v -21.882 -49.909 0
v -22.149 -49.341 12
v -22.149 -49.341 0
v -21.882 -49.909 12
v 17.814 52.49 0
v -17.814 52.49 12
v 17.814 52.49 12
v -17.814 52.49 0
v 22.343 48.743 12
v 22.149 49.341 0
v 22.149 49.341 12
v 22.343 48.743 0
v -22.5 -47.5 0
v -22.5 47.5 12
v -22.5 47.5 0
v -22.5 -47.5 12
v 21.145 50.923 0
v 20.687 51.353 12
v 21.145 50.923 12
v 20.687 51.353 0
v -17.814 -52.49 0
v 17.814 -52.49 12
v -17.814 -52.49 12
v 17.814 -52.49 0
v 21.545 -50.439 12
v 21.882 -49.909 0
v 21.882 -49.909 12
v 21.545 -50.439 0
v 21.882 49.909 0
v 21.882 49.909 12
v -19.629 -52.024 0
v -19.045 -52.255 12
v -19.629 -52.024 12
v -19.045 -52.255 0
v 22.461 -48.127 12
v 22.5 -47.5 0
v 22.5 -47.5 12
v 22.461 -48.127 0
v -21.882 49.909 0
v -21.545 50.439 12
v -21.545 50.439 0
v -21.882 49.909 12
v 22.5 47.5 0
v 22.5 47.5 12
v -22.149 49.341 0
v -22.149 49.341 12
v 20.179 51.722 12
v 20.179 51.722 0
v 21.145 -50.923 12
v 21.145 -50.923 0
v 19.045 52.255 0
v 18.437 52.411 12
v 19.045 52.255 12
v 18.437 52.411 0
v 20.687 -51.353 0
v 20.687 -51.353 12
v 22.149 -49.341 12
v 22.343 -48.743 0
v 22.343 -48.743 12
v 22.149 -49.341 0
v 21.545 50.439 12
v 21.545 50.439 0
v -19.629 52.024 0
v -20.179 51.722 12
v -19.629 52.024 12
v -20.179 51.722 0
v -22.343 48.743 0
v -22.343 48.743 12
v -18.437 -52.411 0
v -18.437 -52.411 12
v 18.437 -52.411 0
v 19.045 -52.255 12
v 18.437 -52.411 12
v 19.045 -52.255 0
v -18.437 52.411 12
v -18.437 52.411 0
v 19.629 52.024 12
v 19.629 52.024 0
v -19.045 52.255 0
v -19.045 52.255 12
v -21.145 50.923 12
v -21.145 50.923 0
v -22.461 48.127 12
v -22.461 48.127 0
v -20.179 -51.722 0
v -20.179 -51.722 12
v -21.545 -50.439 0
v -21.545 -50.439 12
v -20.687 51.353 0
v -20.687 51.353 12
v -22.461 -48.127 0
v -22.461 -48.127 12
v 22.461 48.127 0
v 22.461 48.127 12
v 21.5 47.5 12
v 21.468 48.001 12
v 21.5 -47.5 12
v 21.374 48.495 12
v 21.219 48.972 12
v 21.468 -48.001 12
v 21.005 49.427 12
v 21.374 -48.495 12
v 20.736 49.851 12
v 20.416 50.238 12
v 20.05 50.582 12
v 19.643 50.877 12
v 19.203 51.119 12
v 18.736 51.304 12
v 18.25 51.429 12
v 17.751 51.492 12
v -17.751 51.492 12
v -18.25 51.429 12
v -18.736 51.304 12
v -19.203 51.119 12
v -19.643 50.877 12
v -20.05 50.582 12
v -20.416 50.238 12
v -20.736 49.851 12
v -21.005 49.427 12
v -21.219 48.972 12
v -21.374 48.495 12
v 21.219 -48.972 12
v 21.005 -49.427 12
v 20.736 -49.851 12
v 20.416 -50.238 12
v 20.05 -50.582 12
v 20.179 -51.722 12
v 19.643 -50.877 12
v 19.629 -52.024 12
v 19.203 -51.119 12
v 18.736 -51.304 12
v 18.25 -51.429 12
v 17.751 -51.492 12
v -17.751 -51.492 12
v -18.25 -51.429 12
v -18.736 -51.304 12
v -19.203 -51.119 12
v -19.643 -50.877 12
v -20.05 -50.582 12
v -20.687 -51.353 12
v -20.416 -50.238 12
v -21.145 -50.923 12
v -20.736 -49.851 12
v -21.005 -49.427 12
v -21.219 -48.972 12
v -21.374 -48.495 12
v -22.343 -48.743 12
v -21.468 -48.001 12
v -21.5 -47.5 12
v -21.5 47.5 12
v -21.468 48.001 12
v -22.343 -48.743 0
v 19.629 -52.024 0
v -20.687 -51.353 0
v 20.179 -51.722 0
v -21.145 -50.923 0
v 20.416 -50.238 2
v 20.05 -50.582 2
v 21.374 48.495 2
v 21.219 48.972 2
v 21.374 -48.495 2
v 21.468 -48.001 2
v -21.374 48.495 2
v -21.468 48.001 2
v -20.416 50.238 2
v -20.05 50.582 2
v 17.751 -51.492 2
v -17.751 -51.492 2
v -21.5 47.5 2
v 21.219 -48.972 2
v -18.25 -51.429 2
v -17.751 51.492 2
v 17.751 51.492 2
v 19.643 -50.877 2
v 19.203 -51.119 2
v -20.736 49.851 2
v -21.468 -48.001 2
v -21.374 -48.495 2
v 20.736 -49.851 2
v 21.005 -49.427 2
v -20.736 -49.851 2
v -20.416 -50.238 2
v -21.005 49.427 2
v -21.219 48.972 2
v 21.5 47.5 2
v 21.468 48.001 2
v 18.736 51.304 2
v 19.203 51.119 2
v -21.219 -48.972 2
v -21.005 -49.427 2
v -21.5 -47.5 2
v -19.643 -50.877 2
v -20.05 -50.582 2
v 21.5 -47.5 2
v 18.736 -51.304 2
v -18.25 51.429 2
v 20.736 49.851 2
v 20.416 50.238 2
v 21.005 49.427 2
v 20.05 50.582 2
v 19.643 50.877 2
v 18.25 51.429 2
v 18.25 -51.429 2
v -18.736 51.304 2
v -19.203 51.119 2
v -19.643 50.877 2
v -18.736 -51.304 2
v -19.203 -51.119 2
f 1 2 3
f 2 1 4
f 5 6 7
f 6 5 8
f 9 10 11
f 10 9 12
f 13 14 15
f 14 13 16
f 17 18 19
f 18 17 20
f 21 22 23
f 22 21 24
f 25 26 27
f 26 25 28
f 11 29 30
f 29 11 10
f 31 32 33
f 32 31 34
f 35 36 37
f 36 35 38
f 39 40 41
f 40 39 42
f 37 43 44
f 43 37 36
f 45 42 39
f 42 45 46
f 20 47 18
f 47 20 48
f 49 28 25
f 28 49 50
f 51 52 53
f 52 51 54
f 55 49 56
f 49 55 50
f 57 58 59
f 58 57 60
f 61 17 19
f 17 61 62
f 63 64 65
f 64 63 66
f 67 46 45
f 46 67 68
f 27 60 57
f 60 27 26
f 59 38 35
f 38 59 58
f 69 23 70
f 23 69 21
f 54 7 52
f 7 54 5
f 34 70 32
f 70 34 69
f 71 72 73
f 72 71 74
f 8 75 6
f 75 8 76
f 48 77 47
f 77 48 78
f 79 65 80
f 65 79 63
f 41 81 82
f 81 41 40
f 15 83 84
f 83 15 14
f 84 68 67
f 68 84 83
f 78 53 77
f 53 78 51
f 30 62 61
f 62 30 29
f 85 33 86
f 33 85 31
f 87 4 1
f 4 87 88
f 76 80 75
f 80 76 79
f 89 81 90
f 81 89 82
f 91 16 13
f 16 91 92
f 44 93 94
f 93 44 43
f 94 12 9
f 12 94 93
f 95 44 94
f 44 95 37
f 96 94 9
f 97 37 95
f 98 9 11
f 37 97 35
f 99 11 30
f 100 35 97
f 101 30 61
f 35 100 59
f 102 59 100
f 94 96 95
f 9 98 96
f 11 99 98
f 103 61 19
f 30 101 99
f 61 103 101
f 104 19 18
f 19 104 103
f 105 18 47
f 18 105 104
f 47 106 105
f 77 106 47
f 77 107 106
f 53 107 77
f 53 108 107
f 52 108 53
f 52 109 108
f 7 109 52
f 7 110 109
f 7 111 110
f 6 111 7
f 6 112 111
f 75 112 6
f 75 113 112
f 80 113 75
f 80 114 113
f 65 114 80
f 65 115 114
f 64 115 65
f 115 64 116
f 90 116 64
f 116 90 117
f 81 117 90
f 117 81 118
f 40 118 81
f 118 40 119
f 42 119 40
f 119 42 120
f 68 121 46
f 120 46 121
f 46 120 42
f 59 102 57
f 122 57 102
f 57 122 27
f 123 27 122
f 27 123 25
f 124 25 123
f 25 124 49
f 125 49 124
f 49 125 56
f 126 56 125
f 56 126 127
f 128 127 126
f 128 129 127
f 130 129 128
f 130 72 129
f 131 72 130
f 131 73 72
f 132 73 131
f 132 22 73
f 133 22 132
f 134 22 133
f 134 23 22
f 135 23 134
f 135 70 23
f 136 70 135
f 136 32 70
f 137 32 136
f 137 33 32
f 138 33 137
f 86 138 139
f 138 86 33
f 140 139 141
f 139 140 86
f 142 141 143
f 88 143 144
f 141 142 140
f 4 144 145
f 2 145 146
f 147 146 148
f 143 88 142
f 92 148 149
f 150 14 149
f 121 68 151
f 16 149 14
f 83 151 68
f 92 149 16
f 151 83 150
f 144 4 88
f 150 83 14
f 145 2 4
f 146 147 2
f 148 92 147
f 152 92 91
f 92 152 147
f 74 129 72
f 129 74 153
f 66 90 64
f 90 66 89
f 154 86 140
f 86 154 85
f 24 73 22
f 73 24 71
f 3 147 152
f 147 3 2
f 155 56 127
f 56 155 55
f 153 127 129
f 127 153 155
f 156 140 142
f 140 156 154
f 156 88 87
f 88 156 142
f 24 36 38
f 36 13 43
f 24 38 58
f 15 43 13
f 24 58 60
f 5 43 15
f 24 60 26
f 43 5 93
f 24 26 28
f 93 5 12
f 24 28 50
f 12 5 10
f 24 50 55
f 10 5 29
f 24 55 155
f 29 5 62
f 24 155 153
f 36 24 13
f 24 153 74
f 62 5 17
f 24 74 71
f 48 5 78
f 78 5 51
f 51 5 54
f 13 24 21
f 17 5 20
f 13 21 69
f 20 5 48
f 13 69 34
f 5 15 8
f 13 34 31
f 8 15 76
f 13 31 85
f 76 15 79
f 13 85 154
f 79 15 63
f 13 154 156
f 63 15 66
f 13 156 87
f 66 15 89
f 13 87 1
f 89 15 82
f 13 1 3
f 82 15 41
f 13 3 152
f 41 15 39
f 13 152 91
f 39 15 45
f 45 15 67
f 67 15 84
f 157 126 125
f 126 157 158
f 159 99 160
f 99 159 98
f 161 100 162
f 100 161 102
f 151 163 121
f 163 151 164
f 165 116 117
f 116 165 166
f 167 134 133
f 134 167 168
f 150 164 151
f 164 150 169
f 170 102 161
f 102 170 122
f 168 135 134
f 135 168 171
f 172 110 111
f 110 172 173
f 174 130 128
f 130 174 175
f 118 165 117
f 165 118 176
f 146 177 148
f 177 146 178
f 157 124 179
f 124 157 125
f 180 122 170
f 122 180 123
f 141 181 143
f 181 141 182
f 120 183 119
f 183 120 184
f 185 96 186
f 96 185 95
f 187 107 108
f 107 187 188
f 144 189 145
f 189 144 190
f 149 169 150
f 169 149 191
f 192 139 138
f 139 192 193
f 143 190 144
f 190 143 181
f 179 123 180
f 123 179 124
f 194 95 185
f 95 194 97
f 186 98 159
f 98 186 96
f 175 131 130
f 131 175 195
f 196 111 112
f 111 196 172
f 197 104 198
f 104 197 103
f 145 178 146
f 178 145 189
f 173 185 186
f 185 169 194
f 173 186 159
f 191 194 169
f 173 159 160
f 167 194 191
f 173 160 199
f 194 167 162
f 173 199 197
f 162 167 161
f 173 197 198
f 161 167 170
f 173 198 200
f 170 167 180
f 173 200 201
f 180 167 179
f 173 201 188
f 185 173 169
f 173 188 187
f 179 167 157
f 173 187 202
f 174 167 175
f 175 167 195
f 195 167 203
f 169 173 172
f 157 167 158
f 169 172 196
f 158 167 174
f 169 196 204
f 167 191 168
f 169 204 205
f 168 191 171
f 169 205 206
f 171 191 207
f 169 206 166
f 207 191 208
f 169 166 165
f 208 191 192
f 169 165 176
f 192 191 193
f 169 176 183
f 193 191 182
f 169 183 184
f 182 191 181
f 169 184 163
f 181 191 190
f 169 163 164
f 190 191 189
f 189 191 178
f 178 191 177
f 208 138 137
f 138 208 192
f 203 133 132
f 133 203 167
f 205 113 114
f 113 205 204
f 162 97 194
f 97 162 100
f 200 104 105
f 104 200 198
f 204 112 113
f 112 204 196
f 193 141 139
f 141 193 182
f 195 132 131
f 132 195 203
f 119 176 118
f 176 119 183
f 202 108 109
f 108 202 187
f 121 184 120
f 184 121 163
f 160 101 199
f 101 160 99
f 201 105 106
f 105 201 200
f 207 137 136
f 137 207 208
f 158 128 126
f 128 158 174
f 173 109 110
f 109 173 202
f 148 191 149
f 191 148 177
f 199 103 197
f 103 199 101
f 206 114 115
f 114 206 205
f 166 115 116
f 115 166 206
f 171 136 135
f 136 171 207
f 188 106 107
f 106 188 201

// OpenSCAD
$fn = 50;


difference() {
	union() {
		hull() {
			translate(v = [-17.5000000000, 47.5000000000, 0]) {
				cylinder(h = 12, r = 5);
			}
			translate(v = [17.5000000000, 47.5000000000, 0]) {
				cylinder(h = 12, r = 5);
			}
			translate(v = [-17.5000000000, -47.5000000000, 0]) {
				cylinder(h = 12, r = 5);
			}
			translate(v = [17.5000000000, -47.5000000000, 0]) {
				cylinder(h = 12, r = 5);
			}
		}
	}
	union() {
		translate(v = [0, 0, 2]) {
			hull() {
				translate(v = [-17.5000000000, 47.5000000000, 0]) {
					cylinder(h = 10, r = 4);
				}
				translate(v = [17.5000000000, 47.5000000000, 0]) {
					cylinder(h = 10, r = 4);
				}
				translate(v = [-17.5000000000, -47.5000000000, 0]) {
					cylinder(h = 10, r = 4);
				}
				translate(v = [17.5000000000, -47.5000000000, 0]) {
					cylinder(h = 10, r = 4);
				}
			}
		}
	}
}
